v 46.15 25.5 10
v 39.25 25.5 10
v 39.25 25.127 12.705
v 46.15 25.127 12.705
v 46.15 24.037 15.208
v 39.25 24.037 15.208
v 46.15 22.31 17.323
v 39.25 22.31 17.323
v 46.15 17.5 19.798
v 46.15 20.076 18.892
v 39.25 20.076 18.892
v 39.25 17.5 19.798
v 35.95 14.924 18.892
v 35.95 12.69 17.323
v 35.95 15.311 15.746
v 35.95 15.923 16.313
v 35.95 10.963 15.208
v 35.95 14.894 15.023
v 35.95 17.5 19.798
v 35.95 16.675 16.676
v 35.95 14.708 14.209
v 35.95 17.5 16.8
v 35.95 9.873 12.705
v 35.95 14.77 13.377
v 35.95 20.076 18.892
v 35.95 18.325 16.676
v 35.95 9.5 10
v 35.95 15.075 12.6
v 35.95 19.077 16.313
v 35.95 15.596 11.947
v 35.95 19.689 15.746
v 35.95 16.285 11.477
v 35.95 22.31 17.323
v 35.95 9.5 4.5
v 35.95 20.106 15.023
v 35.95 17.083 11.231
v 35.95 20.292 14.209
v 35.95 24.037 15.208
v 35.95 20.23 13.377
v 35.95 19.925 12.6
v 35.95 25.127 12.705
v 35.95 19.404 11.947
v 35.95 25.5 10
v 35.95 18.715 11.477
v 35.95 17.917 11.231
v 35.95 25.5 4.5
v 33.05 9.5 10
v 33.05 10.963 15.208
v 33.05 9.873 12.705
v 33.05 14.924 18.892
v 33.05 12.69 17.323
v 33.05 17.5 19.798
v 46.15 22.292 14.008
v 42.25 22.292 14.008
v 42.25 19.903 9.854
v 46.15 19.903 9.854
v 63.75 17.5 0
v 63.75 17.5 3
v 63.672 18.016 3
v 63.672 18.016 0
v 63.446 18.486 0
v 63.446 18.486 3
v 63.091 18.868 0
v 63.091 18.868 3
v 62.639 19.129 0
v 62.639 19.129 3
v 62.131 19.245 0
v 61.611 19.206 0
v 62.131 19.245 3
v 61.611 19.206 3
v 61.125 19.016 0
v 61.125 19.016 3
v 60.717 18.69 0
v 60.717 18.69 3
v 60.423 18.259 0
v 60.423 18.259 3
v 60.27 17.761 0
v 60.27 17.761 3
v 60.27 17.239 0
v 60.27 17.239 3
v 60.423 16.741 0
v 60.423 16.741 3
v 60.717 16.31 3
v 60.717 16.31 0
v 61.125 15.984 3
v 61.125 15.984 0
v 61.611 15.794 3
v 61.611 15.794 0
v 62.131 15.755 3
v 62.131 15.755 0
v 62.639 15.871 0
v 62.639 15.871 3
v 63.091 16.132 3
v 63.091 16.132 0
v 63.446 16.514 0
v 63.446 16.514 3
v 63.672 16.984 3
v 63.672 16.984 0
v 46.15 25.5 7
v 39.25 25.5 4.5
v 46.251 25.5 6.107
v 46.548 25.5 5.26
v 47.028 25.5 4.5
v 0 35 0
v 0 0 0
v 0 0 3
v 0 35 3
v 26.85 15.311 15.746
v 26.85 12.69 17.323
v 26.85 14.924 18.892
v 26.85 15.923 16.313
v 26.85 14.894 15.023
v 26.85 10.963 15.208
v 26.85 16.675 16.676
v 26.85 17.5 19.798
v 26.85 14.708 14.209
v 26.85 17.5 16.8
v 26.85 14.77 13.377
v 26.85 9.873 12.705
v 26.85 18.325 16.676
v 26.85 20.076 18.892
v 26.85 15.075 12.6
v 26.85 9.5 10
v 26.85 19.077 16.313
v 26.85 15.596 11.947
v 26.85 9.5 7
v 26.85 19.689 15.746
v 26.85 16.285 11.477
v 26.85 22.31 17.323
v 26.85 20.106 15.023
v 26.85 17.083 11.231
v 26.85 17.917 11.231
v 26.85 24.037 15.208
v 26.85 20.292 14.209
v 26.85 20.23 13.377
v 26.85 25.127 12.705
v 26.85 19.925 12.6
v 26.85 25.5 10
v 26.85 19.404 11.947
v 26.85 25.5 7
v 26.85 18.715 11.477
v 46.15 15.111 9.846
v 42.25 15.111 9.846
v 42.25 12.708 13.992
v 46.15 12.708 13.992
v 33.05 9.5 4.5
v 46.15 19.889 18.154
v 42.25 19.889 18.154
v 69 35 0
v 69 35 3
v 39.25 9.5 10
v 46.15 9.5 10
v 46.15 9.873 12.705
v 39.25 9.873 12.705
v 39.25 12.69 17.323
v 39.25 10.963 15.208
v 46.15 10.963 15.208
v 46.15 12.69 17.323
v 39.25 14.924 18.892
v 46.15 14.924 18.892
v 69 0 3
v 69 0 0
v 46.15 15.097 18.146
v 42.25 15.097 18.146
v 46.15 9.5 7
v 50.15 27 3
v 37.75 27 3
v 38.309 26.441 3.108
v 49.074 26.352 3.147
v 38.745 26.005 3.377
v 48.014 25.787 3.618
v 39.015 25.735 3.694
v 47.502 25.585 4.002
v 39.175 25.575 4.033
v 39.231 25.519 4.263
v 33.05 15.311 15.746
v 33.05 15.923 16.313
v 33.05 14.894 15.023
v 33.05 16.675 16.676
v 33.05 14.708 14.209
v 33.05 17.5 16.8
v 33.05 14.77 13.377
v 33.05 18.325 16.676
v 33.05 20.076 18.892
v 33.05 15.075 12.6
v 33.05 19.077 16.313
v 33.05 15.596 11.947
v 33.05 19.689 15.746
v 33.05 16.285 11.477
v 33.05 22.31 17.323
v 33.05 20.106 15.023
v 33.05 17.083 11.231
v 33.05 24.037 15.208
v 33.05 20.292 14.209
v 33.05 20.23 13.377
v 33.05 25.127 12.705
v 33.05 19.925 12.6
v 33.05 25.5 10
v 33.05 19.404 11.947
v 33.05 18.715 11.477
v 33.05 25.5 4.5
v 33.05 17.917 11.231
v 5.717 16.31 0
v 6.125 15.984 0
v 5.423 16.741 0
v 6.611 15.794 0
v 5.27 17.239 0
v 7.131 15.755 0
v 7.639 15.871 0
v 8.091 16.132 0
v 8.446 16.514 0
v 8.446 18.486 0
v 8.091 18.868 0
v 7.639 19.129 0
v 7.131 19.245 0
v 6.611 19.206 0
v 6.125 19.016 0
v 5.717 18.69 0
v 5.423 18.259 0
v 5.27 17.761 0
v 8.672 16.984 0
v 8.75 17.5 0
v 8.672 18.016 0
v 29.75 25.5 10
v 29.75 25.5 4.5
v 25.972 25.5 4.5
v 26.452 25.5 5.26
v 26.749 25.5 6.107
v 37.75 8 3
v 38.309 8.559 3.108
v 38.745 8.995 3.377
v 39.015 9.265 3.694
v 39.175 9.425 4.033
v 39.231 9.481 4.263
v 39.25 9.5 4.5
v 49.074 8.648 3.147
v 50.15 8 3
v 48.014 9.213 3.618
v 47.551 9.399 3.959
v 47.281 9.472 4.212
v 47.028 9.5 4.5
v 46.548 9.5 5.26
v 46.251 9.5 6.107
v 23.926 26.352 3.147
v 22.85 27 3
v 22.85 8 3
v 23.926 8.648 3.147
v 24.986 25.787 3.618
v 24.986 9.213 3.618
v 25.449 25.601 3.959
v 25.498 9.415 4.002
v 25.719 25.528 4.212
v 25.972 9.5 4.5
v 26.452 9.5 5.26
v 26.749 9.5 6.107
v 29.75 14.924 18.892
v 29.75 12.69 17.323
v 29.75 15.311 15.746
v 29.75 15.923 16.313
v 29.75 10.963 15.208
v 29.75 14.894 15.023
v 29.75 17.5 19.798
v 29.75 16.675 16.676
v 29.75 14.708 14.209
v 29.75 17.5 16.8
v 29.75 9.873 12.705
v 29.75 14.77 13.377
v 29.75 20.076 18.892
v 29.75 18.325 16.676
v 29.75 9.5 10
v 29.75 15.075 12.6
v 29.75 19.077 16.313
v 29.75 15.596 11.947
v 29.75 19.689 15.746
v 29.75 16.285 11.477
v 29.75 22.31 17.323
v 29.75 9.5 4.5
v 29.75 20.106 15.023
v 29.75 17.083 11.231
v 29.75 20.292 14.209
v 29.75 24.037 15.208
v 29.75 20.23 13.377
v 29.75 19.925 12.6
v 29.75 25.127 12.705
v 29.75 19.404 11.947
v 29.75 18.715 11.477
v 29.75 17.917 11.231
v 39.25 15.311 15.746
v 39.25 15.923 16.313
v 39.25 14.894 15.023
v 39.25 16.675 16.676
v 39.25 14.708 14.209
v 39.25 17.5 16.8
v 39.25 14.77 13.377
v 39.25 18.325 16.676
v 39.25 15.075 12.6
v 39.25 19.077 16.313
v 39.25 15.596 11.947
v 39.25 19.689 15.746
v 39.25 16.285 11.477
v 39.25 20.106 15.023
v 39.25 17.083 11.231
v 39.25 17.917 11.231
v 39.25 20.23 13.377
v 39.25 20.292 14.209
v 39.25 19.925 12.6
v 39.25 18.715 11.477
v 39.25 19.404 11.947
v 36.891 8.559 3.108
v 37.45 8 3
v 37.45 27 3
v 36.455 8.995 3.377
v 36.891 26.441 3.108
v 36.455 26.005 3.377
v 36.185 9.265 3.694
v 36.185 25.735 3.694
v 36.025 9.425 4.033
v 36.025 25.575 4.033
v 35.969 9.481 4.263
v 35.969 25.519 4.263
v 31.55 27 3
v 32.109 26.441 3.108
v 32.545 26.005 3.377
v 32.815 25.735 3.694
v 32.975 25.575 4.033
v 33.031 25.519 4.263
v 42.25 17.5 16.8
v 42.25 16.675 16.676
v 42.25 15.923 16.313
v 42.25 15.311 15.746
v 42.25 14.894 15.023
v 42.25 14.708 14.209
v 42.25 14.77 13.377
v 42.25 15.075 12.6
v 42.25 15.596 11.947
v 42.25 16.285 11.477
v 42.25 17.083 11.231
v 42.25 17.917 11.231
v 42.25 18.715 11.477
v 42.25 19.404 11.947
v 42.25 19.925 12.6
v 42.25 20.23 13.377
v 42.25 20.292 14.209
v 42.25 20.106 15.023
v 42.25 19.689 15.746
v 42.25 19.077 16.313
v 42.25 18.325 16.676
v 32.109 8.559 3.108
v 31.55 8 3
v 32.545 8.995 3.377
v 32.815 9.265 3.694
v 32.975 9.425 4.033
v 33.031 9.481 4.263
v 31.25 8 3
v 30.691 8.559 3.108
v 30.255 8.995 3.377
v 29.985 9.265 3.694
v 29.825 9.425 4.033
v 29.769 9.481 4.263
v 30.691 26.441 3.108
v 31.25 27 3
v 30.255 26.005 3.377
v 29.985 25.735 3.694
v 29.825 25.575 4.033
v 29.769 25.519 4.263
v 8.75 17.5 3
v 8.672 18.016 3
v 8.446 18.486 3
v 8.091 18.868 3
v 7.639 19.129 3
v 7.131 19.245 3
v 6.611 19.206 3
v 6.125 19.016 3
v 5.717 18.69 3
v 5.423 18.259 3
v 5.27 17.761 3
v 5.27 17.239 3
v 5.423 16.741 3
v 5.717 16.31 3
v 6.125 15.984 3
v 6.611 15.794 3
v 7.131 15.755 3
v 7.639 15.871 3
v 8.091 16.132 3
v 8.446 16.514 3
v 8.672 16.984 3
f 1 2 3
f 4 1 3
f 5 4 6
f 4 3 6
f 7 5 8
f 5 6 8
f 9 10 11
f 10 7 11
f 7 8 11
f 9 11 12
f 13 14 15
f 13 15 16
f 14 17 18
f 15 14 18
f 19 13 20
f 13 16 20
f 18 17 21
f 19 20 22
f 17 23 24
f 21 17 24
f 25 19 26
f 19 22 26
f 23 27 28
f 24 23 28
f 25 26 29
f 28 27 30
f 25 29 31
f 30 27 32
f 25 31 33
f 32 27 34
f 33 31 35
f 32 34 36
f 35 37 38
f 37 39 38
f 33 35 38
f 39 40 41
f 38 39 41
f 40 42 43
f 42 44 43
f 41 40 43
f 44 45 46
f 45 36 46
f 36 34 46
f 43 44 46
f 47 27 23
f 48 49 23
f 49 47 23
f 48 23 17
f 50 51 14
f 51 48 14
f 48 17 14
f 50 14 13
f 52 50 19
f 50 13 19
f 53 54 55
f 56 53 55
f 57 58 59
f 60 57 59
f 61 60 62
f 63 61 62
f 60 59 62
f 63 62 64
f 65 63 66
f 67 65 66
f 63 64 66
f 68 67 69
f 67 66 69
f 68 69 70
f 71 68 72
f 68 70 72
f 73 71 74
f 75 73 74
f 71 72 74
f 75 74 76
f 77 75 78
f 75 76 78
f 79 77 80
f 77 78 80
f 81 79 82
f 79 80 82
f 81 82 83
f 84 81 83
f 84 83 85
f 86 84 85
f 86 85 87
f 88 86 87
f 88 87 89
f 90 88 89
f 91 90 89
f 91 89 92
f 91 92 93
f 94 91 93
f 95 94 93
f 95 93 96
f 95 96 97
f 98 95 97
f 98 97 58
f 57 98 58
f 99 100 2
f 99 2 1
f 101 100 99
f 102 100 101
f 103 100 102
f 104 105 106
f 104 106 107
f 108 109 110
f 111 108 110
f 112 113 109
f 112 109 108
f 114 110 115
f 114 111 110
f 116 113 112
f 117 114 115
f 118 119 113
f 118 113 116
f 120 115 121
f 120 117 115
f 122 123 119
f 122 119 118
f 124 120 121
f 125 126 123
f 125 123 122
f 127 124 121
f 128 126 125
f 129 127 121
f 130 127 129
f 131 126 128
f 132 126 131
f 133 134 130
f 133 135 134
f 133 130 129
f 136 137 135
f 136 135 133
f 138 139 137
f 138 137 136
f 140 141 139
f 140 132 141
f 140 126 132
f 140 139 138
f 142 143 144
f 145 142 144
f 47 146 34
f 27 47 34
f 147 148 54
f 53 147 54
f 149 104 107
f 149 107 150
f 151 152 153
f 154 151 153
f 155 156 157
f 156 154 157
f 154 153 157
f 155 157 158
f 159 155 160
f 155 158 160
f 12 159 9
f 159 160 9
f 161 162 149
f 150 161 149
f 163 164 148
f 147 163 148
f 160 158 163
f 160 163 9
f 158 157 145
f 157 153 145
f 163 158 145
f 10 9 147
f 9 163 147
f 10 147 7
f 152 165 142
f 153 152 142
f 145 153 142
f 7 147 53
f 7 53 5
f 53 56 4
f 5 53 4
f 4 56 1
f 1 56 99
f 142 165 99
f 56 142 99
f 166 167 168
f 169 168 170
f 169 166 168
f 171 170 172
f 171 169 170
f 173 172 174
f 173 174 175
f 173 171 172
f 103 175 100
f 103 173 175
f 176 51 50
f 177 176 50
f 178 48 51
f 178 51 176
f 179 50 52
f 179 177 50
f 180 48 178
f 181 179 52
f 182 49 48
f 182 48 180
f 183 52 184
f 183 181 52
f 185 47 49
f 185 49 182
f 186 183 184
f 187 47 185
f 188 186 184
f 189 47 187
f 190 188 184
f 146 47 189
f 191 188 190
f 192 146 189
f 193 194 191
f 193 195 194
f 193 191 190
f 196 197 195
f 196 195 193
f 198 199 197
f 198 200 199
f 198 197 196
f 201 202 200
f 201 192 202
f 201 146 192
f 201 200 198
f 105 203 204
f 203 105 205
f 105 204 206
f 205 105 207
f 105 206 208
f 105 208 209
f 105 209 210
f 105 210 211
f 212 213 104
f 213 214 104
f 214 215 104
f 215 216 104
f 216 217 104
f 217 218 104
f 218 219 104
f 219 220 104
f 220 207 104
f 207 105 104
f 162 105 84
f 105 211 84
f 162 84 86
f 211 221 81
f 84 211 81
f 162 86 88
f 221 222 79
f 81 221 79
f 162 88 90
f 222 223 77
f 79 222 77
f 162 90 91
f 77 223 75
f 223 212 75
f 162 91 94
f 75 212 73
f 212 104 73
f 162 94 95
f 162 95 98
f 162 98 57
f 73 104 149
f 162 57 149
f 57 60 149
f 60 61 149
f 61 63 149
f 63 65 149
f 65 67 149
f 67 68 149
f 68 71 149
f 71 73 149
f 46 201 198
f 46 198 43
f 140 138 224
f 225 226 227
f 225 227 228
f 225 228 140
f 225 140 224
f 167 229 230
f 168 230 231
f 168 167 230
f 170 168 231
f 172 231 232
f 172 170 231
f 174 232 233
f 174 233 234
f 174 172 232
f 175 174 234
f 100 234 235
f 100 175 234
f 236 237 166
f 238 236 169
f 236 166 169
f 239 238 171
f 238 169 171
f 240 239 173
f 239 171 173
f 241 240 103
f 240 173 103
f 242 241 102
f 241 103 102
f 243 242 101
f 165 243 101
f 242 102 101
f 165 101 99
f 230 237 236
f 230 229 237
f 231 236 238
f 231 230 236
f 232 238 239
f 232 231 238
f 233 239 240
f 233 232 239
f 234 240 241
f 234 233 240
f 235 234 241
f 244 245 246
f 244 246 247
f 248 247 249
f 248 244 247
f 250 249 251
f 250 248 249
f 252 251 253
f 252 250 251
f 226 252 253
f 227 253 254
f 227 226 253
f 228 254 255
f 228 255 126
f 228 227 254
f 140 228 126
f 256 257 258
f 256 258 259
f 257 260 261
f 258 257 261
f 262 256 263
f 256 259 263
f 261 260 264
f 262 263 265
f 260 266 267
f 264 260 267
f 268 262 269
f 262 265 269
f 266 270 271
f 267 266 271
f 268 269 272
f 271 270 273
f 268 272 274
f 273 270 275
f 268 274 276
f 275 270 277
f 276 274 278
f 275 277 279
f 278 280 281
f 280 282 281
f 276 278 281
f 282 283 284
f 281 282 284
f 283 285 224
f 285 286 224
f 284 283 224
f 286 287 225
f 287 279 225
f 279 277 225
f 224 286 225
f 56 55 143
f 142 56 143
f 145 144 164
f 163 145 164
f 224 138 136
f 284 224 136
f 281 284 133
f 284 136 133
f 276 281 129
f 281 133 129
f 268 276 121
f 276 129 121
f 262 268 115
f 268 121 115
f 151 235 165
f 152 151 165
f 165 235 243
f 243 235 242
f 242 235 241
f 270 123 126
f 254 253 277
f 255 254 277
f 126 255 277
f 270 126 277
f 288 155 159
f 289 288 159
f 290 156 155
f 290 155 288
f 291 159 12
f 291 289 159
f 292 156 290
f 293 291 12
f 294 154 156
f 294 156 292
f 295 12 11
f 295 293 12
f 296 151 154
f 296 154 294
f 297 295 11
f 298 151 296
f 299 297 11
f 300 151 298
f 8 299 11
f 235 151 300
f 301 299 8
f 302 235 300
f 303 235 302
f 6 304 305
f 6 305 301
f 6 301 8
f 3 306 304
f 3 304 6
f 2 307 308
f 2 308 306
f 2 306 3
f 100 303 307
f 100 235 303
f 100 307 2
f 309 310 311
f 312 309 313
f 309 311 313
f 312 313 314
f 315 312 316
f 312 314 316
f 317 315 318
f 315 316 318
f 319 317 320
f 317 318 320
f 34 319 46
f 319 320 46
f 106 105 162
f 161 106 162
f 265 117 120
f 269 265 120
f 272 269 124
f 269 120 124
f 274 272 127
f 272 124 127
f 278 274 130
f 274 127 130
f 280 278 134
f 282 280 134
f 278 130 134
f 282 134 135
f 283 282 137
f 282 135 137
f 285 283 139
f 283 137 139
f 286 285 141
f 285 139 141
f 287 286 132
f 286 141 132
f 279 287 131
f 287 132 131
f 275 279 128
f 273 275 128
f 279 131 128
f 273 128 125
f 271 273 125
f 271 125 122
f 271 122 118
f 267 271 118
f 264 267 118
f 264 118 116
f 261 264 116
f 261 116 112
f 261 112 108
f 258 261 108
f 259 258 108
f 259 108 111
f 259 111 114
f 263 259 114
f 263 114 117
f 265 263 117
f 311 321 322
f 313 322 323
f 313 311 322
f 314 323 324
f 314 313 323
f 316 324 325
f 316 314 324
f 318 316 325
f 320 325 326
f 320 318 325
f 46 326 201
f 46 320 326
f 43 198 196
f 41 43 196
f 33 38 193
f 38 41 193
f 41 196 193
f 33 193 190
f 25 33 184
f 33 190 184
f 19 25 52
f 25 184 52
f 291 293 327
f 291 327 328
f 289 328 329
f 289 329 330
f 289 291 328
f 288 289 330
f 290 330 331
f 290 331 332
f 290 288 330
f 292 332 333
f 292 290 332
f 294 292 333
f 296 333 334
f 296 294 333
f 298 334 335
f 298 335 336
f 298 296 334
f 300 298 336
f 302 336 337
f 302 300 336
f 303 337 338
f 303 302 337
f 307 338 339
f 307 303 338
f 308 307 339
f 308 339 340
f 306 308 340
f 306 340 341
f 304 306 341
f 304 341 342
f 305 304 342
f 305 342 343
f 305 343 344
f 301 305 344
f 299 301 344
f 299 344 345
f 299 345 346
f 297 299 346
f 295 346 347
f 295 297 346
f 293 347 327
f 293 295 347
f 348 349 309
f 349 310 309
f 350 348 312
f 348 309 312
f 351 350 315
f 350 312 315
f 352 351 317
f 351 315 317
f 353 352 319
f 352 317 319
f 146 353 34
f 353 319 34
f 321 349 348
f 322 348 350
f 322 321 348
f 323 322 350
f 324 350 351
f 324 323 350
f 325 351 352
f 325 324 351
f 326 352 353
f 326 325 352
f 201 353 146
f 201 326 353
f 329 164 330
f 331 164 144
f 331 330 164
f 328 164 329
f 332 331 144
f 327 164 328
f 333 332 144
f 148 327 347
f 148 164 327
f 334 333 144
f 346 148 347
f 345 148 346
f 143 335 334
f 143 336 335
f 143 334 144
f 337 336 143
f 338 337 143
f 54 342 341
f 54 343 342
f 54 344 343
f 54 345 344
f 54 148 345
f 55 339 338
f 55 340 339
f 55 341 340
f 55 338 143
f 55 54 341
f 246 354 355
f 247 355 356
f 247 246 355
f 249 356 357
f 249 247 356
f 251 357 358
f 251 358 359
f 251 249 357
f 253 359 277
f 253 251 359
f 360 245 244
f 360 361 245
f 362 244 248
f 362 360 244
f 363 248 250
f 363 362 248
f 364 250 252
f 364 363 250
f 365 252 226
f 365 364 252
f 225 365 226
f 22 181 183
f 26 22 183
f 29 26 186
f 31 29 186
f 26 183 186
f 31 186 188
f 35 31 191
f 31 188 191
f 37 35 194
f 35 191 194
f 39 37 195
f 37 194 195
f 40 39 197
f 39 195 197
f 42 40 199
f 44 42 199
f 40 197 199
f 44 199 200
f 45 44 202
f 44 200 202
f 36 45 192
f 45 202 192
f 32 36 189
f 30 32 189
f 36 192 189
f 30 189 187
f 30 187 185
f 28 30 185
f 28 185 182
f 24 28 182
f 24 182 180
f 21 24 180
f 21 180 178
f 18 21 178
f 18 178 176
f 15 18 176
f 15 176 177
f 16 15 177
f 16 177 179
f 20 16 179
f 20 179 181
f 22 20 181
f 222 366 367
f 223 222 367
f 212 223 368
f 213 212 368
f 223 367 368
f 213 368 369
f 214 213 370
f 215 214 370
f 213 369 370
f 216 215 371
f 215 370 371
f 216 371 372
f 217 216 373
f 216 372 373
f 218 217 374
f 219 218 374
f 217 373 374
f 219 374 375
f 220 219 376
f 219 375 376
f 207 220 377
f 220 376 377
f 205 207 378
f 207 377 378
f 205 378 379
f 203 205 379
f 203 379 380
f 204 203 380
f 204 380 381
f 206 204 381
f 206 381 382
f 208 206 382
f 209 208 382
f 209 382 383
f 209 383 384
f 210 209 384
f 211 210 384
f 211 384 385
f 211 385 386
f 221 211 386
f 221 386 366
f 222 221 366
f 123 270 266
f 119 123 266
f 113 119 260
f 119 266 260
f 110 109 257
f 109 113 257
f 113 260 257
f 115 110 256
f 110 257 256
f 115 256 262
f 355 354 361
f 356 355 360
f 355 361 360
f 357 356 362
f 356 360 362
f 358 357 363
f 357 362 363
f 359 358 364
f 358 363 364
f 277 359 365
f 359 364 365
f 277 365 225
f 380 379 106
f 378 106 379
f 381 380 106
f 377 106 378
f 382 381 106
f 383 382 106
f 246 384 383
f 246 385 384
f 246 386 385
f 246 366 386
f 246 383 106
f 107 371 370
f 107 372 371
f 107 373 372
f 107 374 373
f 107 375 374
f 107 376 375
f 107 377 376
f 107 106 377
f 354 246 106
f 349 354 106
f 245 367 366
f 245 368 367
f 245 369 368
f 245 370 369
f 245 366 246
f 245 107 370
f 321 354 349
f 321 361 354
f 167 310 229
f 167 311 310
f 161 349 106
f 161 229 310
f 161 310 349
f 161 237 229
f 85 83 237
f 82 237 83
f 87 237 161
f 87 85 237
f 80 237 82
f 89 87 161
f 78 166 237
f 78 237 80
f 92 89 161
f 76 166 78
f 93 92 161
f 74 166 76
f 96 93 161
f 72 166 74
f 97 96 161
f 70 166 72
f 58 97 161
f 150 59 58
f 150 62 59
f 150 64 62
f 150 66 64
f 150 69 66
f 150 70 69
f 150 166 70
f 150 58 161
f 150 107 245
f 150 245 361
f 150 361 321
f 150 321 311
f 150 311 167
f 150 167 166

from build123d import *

# Parameters (mm, degrees)
SKETCH_1_W          = 69
SKETCH_1_H          = 35
EXTRUDE_1_DEPTH     = 3
SKETCH_2_W          = 2.9
SKETCH_2_H          = 16
SKETCH_2_W_2        = 6.9
EXTRUDE_2_DEPTH     = 17
CUT_EXTRUDE_1_REACH = 60.323
SKETCH_3_R          = 2.8
FILLET_1_R          = 10
FILLET_2_R          = 4
CUT_EXTRUDE_2_DEPTH = 10
FILLET_3_R          = 1.5
EXTRUDE_START       = -6.9
SKETCH_6_R          = 5.094551448
SKETCH_6_R_2        = 2.8
EXTRUDE_4_DEPTH     = 3
SKETCH_7_R          = 1.75
CUT_EXTRUDE_3_DEPTH = 10


with BuildPart() as part:
    # Эскиз1 → Бобышка-Вытянуть1 (new body)
    with BuildSketch(Plane.XY):
        with Locations((34.5, 17.5)):
            Rectangle(SKETCH_1_W, SKETCH_1_H)
    extrude(amount=EXTRUDE_1_DEPTH)

    # Эскиз2 → Бобышка-Вытянуть2 (add)
    with BuildSketch(Plane.XY.offset(3)):
        with Locations((34.5, 17.5)):
            Rectangle(SKETCH_2_W, SKETCH_2_H)
        with Locations((28.3, 17.5)):
            Rectangle(SKETCH_2_W, SKETCH_2_H)
        with Locations((42.7, 17.5)):
            Rectangle(SKETCH_2_W_2, SKETCH_2_H)
    extrude(amount=EXTRUDE_2_DEPTH)

    # Вырез-Вытянуть1: up to this face of the body (flat: up to its plane)
    cut_extrude_1_end = Plane(part.part.faces().sort_by_distance((35.95, 17.5, 11.5))[0])
    # Эскиз3 → Вырез-Вытянуть1 (cut, up to the picked face)
    with BuildSketch(Plane.ZY.offset(-26.85), mode=Mode.PRIVATE) as cut_extrude_1_sk1:
        with Locations((14, 17.5)):
            Circle(SKETCH_3_R)
    cut_extrude_1_tool1 = split(extrude(cut_extrude_1_sk1.sketch, amount=-CUT_EXTRUDE_1_REACH, mode=Mode.PRIVATE), bisect_by=cut_extrude_1_end, keep=Keep.BOTH, mode=Mode.PRIVATE)
    add(cut_extrude_1_tool1.solids().sort_by(Axis((26.85, 17.5, 14), (1, 0, 0)))[0], mode=Mode.SUBTRACT)

    # Скругление1
    # the kernel refuses this fillet: 10 mm, written as the material it takes off along each edge
    with BuildSketch(Plane(origin=(1.85, 25.5, 20), x_dir=(0, 0, -1), z_dir=(1, 0, 0)), Plane(origin=(54.75, 9.5, 20), x_dir=(0, 0, -1), z_dir=(-1, 0, 0))) as fillet_1_piece_1:
        with BuildLine():
            CenterArc((FILLET_1_R, -FILLET_1_R), FILLET_1_R, 90, 90)
            Line((0, -FILLET_1_R), (0, 0))
            Line((0, 0), (FILLET_1_R, 0))
        make_face()
    extrude(amount=52.9, mode=Mode.SUBTRACT)
    with BuildSketch(Plane(origin=(60.95, 25.5, 20), x_dir=(0, 0, -1), z_dir=(-1, 0, 0)), Plane(origin=(8.05, 9.5, 20), x_dir=(0, 0, -1), z_dir=(1, 0, 0))) as fillet_1_piece_2:
        with BuildLine():
            CenterArc((FILLET_1_R, FILLET_1_R), FILLET_1_R, 180, 90)
            Line((0, FILLET_1_R), (0, 0))
            Line((0, 0), (FILLET_1_R, 0))
        make_face()
    extrude(amount=52.9, mode=Mode.SUBTRACT)
    with BuildSketch(Plane(origin=(14.25, 25.5, 20), x_dir=(0, 0, -1), z_dir=(1, 0, 0)), Plane(origin=(71.15, 9.5, 20), x_dir=(0, 0, -1), z_dir=(-1, 0, 0))) as fillet_1_piece_3:
        with BuildLine():
            CenterArc((FILLET_1_R, -FILLET_1_R), FILLET_1_R, 90, 90)
            Line((0, -FILLET_1_R), (0, 0))
            Line((0, 0), (FILLET_1_R, 0))
        make_face()
    extrude(amount=56.9, mode=Mode.SUBTRACT)

    # Скругление2
    fillet_2_edges = [part.edges().sort_by_distance(p)[0] for p in [
        (46.15, 17.5, 3),
        (26.85, 17.5, 3),
    ]]
    fillet(fillet_2_edges, radius=FILLET_2_R)

    # Эскиз4 → Вырез-Вытянуть2 (cut)
    with BuildSketch(Plane.ZY.offset(-39.25)):
        Polygon((14.008077291, 22.292000427), (9.854044541, 19.902995352), (9.84596725, 15.110994925), (13.991922709, 12.707999573), (18.145955459, 15.097004648), (18.15403275, 19.889005075), align=None)
    extrude(amount=-CUT_EXTRUDE_2_DEPTH, mode=Mode.SUBTRACT)

    # Скругление3
    fillet_3_edges = [part.edges().sort_by_distance(p)[0] for p in [
        (34.5, 25.5, 3),
        (33.05, 17.5, 3),
        (34.5, 9.5, 3),
        (35.95, 17.5, 3),
        (39.25, 17.5, 3),
        (44.7, 9.5, 3),
        (44.7, 25.5, 3),
        (29.75, 17.5, 3),
        (26.3, 25.5, 3),
        (26.3, 9.5, 3),
    ]]
    fillet(fillet_3_edges, radius=FILLET_3_R)

    # Эскиз6 → Бобышка-Вытянуть4 (add)
    with BuildSketch(Plane(origin=(46.15, 0, 0), x_dir=(0, 0, -1), z_dir=(1, 0, 0)).offset(EXTRUDE_START)):
        with Locations((-14, 17.5)):
            Circle(SKETCH_6_R)
        with Locations(Location((-14, 17.5, 0), (0, 0, 180))):
            Circle(SKETCH_6_R_2, mode=Mode.SUBTRACT)
    extrude(amount=EXTRUDE_4_DEPTH)

    # Эскиз7 → Вырез-Вытянуть3 (cut)
    with BuildSketch(Plane.XY.offset(3)):
        with Locations((7, 17.5)):
            Circle(SKETCH_7_R)
        with Locations((62, 17.5)):
            Circle(SKETCH_7_R)
    extrude(amount=-CUT_EXTRUDE_3_DEPTH, mode=Mode.SUBTRACT)


solid = part.part
